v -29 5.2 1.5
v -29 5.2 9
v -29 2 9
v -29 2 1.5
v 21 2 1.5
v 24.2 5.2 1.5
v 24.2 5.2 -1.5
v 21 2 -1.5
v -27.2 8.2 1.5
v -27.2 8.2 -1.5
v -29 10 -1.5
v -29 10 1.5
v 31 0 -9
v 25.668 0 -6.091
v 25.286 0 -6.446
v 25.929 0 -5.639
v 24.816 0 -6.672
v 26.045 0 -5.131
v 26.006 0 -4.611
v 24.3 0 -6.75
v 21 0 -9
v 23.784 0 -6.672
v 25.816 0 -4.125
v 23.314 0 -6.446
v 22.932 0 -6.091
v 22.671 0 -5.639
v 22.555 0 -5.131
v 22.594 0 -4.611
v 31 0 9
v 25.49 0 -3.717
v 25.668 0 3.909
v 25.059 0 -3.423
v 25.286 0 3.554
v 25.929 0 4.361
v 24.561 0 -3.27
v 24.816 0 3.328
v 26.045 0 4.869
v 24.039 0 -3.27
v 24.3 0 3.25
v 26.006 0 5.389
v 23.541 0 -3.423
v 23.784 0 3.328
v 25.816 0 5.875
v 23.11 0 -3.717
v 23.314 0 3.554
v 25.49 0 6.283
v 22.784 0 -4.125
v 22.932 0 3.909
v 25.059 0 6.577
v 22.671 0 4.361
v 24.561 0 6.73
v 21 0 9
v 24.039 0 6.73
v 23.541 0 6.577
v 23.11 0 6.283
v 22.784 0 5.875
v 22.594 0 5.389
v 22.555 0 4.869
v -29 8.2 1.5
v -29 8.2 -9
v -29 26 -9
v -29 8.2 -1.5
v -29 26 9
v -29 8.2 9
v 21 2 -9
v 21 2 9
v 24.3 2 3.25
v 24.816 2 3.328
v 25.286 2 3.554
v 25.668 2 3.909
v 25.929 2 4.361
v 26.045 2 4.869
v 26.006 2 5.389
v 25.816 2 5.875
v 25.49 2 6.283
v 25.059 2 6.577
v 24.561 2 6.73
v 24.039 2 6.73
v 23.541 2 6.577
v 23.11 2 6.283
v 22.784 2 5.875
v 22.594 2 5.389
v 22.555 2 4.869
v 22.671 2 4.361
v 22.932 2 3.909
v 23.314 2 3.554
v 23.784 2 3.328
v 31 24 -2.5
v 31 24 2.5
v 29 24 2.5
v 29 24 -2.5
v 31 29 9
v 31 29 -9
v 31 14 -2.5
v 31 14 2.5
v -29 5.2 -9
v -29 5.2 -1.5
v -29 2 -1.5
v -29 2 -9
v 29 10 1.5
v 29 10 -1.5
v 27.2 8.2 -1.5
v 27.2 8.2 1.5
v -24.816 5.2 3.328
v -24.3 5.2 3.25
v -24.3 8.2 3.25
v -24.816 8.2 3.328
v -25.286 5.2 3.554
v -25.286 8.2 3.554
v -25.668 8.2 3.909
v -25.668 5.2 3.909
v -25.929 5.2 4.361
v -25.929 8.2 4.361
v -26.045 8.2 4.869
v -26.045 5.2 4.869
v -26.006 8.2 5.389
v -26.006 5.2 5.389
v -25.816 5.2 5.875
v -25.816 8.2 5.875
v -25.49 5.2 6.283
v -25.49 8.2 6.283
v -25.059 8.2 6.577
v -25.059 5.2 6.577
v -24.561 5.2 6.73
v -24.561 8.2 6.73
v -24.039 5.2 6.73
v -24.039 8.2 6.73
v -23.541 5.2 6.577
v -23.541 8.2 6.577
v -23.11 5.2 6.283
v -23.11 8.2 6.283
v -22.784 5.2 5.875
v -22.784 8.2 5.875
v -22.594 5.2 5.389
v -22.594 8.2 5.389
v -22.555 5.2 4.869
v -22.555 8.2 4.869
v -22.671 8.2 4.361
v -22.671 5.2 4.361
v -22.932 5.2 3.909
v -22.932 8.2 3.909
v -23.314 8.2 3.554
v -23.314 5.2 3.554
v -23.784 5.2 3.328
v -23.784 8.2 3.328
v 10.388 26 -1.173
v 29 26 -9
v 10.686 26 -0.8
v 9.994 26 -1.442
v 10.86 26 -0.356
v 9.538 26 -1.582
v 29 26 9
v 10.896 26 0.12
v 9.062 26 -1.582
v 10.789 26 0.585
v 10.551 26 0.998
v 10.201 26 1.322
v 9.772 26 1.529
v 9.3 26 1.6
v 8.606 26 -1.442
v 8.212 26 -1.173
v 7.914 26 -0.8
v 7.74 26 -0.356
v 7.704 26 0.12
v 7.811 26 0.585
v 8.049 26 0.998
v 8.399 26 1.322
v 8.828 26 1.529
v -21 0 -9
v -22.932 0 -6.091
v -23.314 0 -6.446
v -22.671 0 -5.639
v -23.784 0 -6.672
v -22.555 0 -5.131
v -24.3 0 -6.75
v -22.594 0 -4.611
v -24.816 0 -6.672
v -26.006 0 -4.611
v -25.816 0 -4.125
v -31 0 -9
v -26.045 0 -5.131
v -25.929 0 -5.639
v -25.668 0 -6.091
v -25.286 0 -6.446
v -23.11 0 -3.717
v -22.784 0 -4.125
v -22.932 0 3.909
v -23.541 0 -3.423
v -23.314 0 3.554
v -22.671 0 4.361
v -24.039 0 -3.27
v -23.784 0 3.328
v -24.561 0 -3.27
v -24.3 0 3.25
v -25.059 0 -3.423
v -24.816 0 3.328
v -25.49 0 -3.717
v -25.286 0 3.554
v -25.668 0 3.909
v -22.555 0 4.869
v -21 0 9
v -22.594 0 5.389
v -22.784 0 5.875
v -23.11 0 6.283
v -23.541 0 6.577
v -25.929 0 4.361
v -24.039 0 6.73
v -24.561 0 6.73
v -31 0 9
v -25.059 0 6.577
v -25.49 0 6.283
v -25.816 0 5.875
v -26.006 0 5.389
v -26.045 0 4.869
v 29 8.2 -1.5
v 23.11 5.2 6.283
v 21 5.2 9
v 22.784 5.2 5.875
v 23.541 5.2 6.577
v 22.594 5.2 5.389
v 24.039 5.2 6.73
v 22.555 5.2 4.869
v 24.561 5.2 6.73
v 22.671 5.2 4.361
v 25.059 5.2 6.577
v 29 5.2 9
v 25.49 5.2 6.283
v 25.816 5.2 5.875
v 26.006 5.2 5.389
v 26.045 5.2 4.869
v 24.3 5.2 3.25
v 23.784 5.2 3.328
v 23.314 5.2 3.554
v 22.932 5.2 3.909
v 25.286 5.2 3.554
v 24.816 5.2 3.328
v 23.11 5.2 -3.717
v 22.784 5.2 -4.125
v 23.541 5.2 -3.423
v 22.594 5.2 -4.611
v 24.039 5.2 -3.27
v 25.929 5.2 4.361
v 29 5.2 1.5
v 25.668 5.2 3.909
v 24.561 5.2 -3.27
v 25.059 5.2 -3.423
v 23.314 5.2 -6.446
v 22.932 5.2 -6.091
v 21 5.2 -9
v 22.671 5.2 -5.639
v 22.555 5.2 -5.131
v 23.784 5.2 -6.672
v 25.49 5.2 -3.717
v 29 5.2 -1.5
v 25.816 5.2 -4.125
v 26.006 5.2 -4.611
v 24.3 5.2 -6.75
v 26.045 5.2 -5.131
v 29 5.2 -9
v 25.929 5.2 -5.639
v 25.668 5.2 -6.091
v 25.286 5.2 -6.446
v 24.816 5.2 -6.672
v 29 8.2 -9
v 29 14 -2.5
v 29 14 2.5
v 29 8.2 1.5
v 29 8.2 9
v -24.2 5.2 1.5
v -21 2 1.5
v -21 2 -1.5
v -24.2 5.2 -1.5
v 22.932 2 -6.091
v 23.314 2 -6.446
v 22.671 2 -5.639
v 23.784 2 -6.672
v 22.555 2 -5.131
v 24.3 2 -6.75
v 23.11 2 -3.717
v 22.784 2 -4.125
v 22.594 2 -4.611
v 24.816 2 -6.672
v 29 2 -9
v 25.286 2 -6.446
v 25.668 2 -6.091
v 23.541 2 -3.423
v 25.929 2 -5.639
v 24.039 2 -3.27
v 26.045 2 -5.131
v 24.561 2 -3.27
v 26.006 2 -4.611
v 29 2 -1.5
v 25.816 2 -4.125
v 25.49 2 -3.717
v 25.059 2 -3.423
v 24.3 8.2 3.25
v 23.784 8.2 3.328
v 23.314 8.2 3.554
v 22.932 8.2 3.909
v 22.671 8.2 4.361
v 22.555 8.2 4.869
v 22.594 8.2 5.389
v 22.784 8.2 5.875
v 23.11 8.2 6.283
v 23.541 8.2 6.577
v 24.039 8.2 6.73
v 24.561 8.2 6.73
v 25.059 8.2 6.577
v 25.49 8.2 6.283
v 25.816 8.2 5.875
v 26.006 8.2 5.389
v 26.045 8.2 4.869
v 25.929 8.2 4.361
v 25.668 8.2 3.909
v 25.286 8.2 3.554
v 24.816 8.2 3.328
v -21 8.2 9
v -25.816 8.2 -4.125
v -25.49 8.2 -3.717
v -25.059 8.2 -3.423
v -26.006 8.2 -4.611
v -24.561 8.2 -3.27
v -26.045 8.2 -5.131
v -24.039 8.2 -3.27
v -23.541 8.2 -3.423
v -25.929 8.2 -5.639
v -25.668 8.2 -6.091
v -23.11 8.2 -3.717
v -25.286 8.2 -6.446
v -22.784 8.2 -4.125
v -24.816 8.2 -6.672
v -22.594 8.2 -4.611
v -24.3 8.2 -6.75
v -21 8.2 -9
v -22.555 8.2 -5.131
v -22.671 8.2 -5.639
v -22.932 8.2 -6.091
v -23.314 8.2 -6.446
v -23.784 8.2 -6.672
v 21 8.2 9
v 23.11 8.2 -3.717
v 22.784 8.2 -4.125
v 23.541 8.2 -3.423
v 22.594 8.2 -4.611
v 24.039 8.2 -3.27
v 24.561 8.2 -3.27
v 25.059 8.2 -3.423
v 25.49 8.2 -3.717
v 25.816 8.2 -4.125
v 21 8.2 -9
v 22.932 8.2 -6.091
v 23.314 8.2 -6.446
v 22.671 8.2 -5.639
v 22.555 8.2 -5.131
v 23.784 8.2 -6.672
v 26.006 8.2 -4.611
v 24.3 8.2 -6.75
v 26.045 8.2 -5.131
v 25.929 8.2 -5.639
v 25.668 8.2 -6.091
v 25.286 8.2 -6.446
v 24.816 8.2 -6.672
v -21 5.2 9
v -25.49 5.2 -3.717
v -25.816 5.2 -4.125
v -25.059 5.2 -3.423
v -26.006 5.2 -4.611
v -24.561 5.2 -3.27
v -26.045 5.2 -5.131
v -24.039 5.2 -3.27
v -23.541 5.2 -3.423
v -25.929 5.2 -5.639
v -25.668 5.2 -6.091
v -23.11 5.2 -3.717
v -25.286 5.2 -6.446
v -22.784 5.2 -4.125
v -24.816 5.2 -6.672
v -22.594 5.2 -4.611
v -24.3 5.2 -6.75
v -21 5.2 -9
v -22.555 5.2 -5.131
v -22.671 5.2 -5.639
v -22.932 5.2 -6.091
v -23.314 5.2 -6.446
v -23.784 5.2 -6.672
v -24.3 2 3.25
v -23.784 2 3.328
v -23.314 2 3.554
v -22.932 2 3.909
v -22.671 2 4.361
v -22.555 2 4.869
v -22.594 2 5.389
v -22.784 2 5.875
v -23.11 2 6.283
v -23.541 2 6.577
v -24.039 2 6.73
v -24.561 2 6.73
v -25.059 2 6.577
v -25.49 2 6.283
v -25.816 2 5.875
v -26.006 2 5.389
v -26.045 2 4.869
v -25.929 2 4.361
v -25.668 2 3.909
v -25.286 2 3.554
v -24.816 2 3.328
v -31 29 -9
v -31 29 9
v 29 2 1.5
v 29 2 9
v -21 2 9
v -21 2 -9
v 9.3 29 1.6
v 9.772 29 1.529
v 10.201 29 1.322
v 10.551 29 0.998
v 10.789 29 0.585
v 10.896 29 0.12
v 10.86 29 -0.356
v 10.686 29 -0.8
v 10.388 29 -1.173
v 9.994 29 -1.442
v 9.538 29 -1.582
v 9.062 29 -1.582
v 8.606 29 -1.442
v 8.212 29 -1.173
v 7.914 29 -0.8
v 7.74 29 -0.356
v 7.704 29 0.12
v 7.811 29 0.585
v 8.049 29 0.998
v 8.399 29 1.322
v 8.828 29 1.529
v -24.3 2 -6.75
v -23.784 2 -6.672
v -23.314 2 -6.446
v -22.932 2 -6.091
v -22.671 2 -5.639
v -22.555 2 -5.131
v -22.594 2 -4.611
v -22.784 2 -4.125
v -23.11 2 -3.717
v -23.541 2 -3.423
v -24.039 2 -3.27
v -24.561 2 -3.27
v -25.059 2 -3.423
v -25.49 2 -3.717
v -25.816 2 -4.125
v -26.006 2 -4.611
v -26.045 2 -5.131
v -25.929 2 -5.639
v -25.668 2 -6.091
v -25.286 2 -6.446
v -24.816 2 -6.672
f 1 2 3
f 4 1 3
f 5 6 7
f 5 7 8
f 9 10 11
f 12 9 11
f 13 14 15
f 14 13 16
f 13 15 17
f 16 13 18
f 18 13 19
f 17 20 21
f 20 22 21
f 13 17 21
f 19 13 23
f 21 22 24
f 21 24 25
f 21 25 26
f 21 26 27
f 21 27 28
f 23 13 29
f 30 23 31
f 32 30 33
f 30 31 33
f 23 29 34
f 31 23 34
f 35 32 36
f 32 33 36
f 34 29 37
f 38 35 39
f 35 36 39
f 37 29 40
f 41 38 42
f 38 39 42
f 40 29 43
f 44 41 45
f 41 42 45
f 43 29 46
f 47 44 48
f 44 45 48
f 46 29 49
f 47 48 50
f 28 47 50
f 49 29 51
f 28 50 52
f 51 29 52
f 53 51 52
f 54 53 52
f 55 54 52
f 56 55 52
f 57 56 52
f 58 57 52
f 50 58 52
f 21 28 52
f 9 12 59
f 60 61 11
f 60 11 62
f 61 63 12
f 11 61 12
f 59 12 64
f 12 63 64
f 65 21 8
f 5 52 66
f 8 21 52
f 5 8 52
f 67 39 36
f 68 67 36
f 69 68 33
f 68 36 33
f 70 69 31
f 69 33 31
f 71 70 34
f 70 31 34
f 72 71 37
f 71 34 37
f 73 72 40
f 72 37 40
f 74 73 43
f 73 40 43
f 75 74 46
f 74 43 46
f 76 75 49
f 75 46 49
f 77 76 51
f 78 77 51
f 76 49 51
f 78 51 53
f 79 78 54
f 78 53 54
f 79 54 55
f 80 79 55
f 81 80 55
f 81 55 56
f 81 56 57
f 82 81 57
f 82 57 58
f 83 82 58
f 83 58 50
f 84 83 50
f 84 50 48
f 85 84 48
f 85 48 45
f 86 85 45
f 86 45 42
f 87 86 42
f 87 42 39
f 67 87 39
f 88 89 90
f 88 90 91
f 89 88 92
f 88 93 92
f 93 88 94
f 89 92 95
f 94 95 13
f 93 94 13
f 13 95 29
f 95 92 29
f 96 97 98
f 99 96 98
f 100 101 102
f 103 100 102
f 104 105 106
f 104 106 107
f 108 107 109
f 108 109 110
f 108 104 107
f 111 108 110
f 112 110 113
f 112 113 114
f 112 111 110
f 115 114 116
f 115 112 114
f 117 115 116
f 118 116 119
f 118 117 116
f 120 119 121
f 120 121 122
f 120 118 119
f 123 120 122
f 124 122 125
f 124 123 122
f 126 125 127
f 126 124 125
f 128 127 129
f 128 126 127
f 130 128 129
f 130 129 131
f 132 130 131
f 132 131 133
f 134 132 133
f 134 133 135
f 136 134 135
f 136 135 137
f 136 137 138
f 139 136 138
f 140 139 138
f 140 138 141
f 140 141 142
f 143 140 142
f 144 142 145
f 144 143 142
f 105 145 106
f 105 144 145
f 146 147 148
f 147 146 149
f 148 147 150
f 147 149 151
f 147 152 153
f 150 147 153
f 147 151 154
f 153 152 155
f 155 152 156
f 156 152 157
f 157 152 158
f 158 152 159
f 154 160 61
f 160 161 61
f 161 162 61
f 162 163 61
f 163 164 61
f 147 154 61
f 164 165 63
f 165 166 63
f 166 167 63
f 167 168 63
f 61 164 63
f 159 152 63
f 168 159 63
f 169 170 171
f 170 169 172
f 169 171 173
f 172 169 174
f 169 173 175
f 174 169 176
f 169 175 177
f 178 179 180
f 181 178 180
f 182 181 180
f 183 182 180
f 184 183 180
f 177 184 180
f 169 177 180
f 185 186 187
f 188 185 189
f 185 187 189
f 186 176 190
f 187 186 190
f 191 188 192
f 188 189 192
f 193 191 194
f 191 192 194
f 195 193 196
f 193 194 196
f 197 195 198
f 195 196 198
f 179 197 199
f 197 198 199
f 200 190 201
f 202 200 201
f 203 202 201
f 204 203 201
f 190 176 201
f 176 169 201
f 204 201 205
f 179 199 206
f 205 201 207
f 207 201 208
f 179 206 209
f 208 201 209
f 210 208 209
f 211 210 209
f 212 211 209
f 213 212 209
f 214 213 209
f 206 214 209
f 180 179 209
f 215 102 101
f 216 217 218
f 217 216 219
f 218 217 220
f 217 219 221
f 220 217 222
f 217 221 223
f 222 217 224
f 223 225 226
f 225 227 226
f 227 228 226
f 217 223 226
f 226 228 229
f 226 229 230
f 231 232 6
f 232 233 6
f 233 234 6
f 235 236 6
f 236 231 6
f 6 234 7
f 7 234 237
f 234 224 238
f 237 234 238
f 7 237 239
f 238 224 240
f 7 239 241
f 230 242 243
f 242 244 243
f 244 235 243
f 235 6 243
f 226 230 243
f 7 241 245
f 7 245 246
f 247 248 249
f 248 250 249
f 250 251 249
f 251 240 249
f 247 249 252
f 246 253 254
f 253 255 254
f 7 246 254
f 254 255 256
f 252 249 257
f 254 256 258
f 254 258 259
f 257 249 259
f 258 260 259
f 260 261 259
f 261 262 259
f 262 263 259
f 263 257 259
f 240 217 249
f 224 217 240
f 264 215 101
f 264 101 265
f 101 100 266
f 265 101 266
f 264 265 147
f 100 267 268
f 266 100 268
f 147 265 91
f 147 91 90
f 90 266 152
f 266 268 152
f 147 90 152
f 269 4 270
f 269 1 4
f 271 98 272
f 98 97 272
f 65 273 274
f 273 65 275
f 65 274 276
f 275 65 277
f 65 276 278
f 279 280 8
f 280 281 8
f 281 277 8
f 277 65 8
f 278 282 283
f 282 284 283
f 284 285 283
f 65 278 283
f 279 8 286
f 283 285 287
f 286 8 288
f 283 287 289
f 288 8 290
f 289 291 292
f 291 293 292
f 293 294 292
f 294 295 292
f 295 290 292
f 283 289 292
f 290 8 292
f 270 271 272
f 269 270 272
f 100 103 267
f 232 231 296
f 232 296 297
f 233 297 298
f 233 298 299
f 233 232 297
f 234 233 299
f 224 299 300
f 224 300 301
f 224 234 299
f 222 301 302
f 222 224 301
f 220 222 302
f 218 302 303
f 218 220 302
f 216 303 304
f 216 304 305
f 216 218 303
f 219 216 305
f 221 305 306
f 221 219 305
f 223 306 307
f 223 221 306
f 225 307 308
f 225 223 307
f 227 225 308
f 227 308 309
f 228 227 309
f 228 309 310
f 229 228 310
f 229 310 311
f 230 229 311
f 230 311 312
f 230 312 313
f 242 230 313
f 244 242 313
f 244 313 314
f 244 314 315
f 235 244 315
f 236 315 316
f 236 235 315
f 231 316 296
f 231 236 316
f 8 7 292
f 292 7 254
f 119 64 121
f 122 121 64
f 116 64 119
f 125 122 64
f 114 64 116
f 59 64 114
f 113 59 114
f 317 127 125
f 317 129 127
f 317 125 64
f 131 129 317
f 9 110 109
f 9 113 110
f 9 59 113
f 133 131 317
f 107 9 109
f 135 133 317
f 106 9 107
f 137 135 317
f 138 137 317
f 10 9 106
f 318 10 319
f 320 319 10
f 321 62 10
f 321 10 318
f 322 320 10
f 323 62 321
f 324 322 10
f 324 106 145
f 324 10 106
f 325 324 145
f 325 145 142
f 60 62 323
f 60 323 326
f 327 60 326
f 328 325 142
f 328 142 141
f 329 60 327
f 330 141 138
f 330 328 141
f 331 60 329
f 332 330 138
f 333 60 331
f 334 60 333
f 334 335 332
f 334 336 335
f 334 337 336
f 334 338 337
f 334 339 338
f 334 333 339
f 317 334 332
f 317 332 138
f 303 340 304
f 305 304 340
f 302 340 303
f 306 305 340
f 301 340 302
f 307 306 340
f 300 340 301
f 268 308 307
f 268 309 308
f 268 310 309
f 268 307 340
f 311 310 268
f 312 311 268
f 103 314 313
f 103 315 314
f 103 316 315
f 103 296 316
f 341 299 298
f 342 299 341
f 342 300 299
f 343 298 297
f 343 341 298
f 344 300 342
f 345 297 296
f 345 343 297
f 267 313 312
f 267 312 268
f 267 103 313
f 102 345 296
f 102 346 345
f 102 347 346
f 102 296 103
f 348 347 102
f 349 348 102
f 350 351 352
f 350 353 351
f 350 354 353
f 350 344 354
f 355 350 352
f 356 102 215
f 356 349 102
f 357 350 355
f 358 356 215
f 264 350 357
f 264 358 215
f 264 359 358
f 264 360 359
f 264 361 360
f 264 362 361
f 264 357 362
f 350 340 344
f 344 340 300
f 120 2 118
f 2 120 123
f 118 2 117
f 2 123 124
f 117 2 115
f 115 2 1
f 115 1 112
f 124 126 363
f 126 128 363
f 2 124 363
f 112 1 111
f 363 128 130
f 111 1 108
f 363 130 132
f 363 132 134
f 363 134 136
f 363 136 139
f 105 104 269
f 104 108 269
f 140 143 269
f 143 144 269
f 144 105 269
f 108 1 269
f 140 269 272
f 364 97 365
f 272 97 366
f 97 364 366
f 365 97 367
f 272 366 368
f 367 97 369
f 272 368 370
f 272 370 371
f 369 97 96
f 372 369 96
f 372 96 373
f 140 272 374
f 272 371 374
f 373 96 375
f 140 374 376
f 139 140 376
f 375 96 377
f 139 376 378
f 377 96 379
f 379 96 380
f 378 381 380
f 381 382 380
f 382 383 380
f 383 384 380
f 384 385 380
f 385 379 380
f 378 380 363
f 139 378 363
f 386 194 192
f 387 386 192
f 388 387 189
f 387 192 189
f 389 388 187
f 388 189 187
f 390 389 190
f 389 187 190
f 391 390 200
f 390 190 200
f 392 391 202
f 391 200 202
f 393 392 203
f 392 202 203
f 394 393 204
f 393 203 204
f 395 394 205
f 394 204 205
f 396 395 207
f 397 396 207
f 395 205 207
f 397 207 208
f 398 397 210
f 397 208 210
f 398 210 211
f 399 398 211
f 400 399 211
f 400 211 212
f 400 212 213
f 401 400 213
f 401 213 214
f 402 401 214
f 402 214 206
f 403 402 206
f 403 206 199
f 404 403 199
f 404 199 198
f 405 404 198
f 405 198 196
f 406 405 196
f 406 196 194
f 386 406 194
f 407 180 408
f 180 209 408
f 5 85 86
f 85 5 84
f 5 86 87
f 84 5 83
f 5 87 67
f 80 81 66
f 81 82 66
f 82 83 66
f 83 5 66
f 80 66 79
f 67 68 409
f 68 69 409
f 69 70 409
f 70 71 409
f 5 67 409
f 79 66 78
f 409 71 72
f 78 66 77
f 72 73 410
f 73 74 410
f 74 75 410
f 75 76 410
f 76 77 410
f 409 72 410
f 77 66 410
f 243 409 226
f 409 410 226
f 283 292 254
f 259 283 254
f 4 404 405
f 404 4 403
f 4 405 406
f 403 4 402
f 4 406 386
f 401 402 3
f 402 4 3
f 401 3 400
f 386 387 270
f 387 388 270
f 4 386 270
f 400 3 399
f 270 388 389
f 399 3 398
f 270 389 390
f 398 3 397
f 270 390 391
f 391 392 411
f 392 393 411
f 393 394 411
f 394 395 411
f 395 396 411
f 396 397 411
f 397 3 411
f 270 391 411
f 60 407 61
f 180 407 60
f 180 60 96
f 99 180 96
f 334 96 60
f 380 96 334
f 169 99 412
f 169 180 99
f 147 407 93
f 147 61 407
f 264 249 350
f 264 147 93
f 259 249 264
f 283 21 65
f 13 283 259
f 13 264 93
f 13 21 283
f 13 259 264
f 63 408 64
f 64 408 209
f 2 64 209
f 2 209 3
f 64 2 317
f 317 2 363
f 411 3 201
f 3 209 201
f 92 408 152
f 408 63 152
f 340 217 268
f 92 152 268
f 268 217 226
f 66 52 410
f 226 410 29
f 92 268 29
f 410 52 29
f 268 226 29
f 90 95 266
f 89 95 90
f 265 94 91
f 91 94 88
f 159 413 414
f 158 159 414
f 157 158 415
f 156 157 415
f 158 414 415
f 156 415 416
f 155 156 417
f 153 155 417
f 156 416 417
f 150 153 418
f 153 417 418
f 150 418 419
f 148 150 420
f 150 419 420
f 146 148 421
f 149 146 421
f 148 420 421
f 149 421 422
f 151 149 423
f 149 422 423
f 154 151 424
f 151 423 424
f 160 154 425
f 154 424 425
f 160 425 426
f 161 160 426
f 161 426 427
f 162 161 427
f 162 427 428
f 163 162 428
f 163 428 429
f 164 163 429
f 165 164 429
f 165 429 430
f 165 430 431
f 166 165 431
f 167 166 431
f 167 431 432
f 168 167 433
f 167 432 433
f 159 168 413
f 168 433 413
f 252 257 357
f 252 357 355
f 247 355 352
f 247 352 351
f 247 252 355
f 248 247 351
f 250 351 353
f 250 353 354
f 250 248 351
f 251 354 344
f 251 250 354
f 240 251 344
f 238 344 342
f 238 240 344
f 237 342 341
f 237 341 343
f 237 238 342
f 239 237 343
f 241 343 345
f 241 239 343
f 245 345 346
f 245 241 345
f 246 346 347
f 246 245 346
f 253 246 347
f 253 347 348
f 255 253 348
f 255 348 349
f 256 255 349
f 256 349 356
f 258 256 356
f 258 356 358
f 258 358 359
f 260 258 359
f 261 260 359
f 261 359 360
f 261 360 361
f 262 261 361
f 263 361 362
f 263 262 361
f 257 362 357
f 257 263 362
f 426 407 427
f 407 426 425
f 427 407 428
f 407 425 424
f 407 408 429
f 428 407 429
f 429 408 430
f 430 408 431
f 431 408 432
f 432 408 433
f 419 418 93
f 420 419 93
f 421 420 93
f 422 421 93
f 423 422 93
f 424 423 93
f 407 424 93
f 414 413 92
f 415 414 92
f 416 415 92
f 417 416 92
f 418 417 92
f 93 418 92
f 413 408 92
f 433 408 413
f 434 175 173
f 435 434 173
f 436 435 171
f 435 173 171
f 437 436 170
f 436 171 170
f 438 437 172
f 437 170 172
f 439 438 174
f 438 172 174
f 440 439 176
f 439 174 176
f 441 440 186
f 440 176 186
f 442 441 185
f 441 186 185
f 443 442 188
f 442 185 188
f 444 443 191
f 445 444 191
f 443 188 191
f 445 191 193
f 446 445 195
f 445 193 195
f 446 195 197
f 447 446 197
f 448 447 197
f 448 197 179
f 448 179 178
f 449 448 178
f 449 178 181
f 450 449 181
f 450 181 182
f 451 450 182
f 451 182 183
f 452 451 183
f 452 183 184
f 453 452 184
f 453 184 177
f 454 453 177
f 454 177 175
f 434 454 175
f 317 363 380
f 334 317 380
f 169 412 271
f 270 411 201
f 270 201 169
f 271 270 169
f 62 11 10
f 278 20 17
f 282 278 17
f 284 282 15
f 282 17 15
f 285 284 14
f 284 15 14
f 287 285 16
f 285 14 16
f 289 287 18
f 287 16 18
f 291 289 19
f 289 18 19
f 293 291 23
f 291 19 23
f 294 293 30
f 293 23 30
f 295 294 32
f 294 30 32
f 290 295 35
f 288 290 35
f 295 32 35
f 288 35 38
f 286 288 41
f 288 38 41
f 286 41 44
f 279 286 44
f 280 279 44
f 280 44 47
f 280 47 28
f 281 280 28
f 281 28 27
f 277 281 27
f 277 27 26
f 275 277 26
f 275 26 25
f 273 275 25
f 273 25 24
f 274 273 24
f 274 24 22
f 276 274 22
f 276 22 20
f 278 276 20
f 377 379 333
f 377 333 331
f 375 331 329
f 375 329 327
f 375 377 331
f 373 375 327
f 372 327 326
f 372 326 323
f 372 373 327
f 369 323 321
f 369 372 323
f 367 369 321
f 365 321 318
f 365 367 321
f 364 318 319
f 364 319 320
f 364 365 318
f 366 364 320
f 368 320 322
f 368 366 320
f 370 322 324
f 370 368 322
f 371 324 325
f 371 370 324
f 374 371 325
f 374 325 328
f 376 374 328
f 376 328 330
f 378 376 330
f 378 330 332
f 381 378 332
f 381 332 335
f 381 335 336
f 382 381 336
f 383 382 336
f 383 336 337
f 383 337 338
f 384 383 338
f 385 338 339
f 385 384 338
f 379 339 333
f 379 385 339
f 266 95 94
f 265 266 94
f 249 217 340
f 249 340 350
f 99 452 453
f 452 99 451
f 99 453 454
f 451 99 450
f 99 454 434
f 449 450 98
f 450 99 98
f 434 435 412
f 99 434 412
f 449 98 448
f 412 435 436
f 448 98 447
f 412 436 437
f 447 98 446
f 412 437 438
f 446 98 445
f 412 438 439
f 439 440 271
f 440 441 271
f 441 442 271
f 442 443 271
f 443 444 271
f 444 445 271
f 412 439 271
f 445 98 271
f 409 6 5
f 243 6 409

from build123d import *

# Parameters (mm, degrees)
RESSALTO_EXTRUS_O1_DEPTH = 9
ESBO_O2_R                = 1.75
CORTE_EXTRUS_O1_DEPTH    = 16
RESSALTO_EXTRUS_O3_DEPTH = 1.5
ESBO_O6_R                = 1.6
CORTE_EXTRUS_O2_DEPTH    = 3
ESBO_O7_W                = 5
ESBO_O7_H                = 10
CORTE_EXTRUS_O3_DEPTH    = 10
RESSALTO_EXTRUS_O4_START = 3.2
ESBO_O8_W                = 8
ESBO_O8_H                = 18
ESBO_O8_R                = 1.75
RESSALTO_EXTRUS_O4_DEPTH = 3


with BuildPart() as part:
    # Esboço1 → Ressalto-extrusão1 (new, symmetric)
    with BuildSketch(Plane.XY):
        Polygon((-21, 0), (-31, 0), (-31, 29), (31, 29), (31, 0), (21, 0), (21, 2), (29, 2), (29, 26), (-29, 26), (-29, 2), (-21, 2), align=None)
    extrude(amount=RESSALTO_EXTRUS_O1_DEPTH, both=True)

    # Esboço2 → Corte-extrusão1 (cut)
    with BuildSketch(Plane.XZ):
        with Locations(Location((-24.3, -5, 0), (0, 0, 270))):
            Circle(ESBO_O2_R)
        with Locations(Location((-24.3, 5, 0), (0, 0, 270))):
            Circle(ESBO_O2_R)
        with Locations(Location((24.3, 5, 0), (0, 0, 270))):
            Circle(ESBO_O2_R)
        with Locations(Location((24.3, -5, 0), (0, 0, 270))):
            Circle(ESBO_O2_R)
    extrude(amount=-CORTE_EXTRUS_O1_DEPTH, mode=Mode.SUBTRACT)

    # Esboço4 → Ressalto-extrusão3 (add, symmetric)
    with BuildSketch(Plane.XY):
        Polygon((-21, 2), (-29, 10), (-29, 2), align=None)
        Polygon((21, 2), (29, 2), (29, 10), align=None)
    extrude(amount=RESSALTO_EXTRUS_O3_DEPTH, both=True)

    # Esboço6 → Corte-extrusão2 (cut)
    with BuildSketch(Plane(origin=(0, 29, 0), x_dir=(1, 0, 0), z_dir=(0, 1, 0))):
        with Locations(Location((9.3, 0, 0), (0, 0, 270))):
            Circle(ESBO_O6_R)
    extrude(amount=-CORTE_EXTRUS_O2_DEPTH, mode=Mode.SUBTRACT)

    # Esboço7 → Corte-extrusão3 (cut)
    with BuildSketch(Plane(origin=(31, 0, 0), x_dir=(0, 0, -1), z_dir=(1, 0, 0))):
        with Locations((0, 19)):
            Rectangle(ESBO_O7_W, ESBO_O7_H)
    extrude(amount=-CORTE_EXTRUS_O3_DEPTH, mode=Mode.SUBTRACT)

    # Esboço8 → Ressalto-extrusão4 (add)
    # profile 1 of 2: a face of its own
    with BuildSketch(Plane(origin=(0, 2, 0), x_dir=(1, 0, 0), z_dir=(0, 1, 0)).offset(RESSALTO_EXTRUS_O4_START)):
        with Locations((-25, 0)):
            Rectangle(ESBO_O8_W, ESBO_O8_H)
        with Locations(Location((-24.3, -5, 0), (0, 0, 90))):
            Circle(ESBO_O8_R, mode=Mode.SUBTRACT)
        with Locations(Location((-24.3, 5, 0), (0, 0, 90))):
            Circle(ESBO_O8_R, mode=Mode.SUBTRACT)
    # profile 2 of 2: a face of its own
    with BuildSketch(Plane(origin=(0, 2, 0), x_dir=(1, 0, 0), z_dir=(0, 1, 0)).offset(RESSALTO_EXTRUS_O4_START)):
        with Locations((25, 0)):
            Rectangle(ESBO_O8_W, ESBO_O8_H)
        with Locations(Location((24.3, -5, 0), (0, 0, 90))):
            Circle(ESBO_O8_R, mode=Mode.SUBTRACT)
        with Locations(Location((24.3, 5, 0), (0, 0, 90))):
            Circle(ESBO_O8_R, mode=Mode.SUBTRACT)
    extrude(amount=RESSALTO_EXTRUS_O4_DEPTH)


solid = part.part
